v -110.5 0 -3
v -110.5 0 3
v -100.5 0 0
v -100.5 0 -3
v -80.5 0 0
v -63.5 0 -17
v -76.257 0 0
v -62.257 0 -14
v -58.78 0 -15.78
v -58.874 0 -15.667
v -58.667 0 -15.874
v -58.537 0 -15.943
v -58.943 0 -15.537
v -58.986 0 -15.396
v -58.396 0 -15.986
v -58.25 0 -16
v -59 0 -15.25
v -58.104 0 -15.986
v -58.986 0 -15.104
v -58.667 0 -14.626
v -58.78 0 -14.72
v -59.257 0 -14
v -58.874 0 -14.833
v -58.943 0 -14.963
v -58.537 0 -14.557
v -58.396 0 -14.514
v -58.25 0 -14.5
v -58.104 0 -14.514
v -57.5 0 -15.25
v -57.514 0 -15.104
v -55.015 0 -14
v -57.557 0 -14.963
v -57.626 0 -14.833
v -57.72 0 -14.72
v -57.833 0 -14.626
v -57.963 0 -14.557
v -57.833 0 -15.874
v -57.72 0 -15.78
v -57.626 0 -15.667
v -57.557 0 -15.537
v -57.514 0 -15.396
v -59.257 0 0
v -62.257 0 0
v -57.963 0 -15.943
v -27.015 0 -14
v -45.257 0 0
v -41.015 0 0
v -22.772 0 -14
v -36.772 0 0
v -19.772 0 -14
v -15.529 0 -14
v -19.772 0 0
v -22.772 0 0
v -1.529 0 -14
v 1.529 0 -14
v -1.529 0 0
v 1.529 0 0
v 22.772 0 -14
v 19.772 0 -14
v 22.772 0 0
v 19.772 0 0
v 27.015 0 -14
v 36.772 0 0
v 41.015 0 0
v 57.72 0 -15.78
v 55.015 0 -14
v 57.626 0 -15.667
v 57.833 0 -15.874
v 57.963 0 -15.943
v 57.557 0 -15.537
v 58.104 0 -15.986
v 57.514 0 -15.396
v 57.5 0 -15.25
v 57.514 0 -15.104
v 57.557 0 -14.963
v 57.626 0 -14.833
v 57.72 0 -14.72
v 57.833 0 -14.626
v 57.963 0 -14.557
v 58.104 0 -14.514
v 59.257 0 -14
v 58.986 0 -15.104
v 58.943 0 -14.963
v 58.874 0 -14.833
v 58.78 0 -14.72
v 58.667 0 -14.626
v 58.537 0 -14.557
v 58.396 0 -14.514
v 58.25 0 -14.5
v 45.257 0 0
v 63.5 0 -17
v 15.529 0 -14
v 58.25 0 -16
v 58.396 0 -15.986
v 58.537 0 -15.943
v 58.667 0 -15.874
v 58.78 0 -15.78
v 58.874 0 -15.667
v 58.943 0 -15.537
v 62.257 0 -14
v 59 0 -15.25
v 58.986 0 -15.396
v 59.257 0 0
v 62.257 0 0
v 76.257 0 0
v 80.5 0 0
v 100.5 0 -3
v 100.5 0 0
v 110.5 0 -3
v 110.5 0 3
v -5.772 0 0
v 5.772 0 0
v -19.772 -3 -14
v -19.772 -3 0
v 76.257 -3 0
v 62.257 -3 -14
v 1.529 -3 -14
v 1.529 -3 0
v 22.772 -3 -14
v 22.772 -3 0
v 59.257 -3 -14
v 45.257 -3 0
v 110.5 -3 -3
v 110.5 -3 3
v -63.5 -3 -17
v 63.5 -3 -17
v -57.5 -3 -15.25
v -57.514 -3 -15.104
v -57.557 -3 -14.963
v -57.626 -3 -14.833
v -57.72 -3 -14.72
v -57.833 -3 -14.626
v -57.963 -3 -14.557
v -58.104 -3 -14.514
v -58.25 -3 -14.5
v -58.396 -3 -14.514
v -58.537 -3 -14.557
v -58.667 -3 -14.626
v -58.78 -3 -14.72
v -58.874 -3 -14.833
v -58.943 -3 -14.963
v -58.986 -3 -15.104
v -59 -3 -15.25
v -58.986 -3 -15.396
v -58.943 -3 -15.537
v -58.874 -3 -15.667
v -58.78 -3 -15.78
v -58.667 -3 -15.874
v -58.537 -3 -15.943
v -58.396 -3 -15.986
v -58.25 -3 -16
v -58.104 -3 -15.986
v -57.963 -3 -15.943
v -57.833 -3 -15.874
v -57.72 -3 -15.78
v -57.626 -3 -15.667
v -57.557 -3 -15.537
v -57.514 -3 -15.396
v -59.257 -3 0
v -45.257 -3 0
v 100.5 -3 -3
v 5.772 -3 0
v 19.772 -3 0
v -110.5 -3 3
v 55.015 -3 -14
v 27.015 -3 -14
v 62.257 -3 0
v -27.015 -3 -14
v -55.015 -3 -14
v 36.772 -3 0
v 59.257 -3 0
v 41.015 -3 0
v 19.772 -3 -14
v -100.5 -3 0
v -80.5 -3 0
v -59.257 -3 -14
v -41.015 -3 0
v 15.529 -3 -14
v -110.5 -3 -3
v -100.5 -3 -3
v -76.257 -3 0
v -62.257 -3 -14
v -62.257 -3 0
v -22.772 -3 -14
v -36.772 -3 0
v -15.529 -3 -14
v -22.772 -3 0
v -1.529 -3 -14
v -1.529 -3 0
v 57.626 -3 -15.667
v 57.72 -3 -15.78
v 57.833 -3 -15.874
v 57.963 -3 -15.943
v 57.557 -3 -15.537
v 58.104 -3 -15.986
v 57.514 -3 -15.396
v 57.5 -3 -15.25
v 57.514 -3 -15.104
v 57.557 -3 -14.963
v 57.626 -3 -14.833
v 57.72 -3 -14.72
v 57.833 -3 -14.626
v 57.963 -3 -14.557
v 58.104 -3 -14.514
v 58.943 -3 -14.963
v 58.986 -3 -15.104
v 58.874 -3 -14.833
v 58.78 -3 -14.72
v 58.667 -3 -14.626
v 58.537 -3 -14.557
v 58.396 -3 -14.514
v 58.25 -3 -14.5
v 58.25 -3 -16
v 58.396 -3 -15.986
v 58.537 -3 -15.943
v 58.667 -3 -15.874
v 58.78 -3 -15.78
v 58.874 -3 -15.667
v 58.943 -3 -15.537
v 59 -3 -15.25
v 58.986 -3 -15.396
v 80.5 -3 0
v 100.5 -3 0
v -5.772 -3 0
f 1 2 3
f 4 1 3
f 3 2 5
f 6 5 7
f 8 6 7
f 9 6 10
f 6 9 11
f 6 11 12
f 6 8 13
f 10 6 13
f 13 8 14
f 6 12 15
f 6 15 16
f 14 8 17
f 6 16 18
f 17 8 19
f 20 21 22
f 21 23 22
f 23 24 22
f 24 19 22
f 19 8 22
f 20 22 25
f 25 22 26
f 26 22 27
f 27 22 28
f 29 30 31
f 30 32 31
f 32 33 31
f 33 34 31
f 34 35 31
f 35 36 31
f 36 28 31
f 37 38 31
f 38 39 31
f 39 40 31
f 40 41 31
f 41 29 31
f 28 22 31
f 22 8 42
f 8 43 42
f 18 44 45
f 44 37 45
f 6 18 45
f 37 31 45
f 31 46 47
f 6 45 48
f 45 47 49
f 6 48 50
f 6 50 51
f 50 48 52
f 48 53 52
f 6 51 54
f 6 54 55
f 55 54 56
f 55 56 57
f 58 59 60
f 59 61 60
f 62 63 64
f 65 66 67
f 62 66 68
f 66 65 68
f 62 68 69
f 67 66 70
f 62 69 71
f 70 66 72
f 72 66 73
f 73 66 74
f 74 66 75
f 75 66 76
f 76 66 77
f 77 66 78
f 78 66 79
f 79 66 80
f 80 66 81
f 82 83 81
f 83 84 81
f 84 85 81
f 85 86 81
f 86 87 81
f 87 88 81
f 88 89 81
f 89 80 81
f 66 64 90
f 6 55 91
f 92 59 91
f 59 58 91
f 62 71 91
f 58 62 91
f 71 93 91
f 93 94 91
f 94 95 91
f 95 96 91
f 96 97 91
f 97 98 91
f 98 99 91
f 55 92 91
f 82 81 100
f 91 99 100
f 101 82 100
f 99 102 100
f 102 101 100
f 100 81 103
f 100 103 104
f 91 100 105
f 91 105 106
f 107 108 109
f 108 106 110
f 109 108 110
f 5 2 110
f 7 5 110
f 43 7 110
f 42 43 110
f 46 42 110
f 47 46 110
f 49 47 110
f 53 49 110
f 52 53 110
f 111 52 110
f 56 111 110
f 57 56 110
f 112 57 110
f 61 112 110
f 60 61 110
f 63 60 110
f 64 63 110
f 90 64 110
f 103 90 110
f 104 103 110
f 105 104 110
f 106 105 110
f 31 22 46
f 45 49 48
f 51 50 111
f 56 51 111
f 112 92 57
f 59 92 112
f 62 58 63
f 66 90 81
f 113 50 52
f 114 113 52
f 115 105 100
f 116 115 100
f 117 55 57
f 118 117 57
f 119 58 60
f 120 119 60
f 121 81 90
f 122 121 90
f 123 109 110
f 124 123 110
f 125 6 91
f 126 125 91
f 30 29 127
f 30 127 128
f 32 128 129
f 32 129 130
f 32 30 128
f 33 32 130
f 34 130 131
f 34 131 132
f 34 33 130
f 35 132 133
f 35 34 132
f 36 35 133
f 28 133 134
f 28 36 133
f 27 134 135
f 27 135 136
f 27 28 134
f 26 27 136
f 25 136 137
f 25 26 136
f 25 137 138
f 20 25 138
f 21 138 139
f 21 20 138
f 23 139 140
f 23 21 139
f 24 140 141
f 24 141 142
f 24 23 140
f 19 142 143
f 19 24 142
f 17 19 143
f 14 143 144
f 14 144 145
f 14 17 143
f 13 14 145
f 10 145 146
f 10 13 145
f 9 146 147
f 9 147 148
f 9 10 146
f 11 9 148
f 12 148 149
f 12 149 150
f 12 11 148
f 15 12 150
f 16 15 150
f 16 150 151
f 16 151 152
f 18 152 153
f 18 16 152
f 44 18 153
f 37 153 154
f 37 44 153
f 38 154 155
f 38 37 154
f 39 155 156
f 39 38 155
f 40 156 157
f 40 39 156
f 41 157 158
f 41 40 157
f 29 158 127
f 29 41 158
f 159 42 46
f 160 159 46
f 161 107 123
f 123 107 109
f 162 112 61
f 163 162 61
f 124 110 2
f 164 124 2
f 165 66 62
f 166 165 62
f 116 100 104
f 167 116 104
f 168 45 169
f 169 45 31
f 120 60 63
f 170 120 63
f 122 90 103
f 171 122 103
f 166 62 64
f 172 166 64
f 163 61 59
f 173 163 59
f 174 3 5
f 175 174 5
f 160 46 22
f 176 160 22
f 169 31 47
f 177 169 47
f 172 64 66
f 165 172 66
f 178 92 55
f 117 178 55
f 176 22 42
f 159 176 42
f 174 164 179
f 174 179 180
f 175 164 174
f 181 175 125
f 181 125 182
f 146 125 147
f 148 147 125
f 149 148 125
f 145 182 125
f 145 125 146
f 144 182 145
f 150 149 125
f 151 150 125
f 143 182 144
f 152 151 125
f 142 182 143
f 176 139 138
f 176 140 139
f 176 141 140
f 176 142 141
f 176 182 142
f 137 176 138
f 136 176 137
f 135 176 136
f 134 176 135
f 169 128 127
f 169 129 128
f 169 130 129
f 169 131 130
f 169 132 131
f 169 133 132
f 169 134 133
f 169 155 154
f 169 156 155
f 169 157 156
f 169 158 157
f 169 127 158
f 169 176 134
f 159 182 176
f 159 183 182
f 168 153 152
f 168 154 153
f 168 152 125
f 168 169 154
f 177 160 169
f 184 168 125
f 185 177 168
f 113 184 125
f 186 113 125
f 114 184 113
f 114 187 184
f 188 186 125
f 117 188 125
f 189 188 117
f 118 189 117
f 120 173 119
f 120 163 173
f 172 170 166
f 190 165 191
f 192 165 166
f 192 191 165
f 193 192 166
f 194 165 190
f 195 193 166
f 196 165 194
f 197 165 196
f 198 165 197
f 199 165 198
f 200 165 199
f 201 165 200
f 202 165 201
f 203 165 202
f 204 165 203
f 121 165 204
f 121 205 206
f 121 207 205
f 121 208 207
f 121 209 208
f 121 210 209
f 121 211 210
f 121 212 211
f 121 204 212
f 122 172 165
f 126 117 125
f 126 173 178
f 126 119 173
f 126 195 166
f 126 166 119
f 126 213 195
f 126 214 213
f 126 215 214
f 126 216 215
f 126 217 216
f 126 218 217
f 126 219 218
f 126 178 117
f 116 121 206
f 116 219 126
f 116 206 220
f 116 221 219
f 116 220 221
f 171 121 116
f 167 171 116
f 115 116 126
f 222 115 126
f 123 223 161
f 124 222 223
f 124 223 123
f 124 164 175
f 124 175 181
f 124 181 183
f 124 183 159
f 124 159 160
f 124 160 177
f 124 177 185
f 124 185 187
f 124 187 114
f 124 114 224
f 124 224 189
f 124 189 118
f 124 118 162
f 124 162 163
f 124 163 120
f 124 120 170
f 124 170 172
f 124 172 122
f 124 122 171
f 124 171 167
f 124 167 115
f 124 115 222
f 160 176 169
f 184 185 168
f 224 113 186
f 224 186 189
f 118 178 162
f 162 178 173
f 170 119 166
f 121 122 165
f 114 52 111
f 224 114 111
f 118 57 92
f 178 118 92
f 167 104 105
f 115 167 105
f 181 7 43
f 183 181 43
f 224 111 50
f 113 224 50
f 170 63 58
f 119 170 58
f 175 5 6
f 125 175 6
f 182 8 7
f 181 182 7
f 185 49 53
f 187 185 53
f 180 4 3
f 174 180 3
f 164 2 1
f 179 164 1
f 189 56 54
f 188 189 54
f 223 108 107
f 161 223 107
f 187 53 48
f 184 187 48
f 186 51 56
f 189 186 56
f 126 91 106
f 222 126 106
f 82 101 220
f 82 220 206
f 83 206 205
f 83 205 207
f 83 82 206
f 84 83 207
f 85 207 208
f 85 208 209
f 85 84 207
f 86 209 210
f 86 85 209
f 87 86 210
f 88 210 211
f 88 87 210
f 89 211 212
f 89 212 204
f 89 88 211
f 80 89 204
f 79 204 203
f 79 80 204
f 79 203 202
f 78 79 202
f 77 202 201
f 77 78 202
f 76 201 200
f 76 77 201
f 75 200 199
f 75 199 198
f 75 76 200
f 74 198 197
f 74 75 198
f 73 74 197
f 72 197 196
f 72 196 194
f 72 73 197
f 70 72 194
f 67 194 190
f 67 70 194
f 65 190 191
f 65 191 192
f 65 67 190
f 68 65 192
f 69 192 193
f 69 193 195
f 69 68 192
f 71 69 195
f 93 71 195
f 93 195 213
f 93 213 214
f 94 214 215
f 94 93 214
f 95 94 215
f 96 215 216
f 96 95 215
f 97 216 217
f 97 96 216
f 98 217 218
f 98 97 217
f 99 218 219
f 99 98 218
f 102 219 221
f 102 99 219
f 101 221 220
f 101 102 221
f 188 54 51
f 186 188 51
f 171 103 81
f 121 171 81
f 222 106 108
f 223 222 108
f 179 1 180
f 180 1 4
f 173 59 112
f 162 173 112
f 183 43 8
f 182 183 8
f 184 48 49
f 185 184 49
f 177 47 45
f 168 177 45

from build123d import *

# Parameters (mm, degrees)
F0_R     = 0.75
F1_DEPTH = 3


with BuildPart() as f1:
    # F0 (on Front) → F1 (new body)
    with BuildSketch(Plane.XZ):
        Polygon((-100.5, -3), (-100.5, 0), (-80.5, 0), (-63.5, -17), (0, -17), (63.5, -17), (80.5, 0), (100.5, 0), (100.5, -3), (110.5, -3), (110.5, 0), (110.5, 3), (0, 3), (-110.5, 3), (-110.5, 0), (-110.5, -3), align=None)
        with Locations((-58.25, -15.25)):
            Circle(F0_R, mode=Mode.SUBTRACT)
        with Locations((58.25, -15.25)):
            Circle(F0_R, mode=Mode.SUBTRACT)
        Polygon((-62.257359, -14), (-76.257359, 0), (-62.257359, 0), align=None, mode=Mode.SUBTRACT)
        Polygon((-45.257359, 0), (-59.257359, -14), (-59.257359, 0), align=None, mode=Mode.SUBTRACT)
        Polygon((-55.014719, -14), (-41.014719, 0), (-27.014719, -14), align=None, mode=Mode.SUBTRACT)
        Polygon((-22.772078, -14), (-36.772078, 0), (-22.772078, 0), align=None, mode=Mode.SUBTRACT)
        Polygon((-5.772078, 0), (-19.772078, -14), (-19.772078, 0), align=None, mode=Mode.SUBTRACT)
        Polygon((-1.529437, 0), (-1.529437, -14), (-15.529437, -14), align=None, mode=Mode.SUBTRACT)
        Polygon((1.529437, -14), (1.529437, 0), (15.529437, -14), align=None, mode=Mode.SUBTRACT)
        Polygon((19.772078, 0), (19.772078, -14), (5.772078, 0), align=None, mode=Mode.SUBTRACT)
        Polygon((36.772078, 0), (22.772078, -14), (22.772078, 0), align=None, mode=Mode.SUBTRACT)
        Polygon((27.014719, -14), (41.014719, 0), (55.014719, -14), align=None, mode=Mode.SUBTRACT)
        Polygon((45.257359, 0), (59.257359, 0), (59.257359, -14), align=None, mode=Mode.SUBTRACT)
        Polygon((62.257359, -14), (62.257359, 0), (76.257359, 0), align=None, mode=Mode.SUBTRACT)
    extrude(amount=F1_DEPTH)


solid = f1.part
